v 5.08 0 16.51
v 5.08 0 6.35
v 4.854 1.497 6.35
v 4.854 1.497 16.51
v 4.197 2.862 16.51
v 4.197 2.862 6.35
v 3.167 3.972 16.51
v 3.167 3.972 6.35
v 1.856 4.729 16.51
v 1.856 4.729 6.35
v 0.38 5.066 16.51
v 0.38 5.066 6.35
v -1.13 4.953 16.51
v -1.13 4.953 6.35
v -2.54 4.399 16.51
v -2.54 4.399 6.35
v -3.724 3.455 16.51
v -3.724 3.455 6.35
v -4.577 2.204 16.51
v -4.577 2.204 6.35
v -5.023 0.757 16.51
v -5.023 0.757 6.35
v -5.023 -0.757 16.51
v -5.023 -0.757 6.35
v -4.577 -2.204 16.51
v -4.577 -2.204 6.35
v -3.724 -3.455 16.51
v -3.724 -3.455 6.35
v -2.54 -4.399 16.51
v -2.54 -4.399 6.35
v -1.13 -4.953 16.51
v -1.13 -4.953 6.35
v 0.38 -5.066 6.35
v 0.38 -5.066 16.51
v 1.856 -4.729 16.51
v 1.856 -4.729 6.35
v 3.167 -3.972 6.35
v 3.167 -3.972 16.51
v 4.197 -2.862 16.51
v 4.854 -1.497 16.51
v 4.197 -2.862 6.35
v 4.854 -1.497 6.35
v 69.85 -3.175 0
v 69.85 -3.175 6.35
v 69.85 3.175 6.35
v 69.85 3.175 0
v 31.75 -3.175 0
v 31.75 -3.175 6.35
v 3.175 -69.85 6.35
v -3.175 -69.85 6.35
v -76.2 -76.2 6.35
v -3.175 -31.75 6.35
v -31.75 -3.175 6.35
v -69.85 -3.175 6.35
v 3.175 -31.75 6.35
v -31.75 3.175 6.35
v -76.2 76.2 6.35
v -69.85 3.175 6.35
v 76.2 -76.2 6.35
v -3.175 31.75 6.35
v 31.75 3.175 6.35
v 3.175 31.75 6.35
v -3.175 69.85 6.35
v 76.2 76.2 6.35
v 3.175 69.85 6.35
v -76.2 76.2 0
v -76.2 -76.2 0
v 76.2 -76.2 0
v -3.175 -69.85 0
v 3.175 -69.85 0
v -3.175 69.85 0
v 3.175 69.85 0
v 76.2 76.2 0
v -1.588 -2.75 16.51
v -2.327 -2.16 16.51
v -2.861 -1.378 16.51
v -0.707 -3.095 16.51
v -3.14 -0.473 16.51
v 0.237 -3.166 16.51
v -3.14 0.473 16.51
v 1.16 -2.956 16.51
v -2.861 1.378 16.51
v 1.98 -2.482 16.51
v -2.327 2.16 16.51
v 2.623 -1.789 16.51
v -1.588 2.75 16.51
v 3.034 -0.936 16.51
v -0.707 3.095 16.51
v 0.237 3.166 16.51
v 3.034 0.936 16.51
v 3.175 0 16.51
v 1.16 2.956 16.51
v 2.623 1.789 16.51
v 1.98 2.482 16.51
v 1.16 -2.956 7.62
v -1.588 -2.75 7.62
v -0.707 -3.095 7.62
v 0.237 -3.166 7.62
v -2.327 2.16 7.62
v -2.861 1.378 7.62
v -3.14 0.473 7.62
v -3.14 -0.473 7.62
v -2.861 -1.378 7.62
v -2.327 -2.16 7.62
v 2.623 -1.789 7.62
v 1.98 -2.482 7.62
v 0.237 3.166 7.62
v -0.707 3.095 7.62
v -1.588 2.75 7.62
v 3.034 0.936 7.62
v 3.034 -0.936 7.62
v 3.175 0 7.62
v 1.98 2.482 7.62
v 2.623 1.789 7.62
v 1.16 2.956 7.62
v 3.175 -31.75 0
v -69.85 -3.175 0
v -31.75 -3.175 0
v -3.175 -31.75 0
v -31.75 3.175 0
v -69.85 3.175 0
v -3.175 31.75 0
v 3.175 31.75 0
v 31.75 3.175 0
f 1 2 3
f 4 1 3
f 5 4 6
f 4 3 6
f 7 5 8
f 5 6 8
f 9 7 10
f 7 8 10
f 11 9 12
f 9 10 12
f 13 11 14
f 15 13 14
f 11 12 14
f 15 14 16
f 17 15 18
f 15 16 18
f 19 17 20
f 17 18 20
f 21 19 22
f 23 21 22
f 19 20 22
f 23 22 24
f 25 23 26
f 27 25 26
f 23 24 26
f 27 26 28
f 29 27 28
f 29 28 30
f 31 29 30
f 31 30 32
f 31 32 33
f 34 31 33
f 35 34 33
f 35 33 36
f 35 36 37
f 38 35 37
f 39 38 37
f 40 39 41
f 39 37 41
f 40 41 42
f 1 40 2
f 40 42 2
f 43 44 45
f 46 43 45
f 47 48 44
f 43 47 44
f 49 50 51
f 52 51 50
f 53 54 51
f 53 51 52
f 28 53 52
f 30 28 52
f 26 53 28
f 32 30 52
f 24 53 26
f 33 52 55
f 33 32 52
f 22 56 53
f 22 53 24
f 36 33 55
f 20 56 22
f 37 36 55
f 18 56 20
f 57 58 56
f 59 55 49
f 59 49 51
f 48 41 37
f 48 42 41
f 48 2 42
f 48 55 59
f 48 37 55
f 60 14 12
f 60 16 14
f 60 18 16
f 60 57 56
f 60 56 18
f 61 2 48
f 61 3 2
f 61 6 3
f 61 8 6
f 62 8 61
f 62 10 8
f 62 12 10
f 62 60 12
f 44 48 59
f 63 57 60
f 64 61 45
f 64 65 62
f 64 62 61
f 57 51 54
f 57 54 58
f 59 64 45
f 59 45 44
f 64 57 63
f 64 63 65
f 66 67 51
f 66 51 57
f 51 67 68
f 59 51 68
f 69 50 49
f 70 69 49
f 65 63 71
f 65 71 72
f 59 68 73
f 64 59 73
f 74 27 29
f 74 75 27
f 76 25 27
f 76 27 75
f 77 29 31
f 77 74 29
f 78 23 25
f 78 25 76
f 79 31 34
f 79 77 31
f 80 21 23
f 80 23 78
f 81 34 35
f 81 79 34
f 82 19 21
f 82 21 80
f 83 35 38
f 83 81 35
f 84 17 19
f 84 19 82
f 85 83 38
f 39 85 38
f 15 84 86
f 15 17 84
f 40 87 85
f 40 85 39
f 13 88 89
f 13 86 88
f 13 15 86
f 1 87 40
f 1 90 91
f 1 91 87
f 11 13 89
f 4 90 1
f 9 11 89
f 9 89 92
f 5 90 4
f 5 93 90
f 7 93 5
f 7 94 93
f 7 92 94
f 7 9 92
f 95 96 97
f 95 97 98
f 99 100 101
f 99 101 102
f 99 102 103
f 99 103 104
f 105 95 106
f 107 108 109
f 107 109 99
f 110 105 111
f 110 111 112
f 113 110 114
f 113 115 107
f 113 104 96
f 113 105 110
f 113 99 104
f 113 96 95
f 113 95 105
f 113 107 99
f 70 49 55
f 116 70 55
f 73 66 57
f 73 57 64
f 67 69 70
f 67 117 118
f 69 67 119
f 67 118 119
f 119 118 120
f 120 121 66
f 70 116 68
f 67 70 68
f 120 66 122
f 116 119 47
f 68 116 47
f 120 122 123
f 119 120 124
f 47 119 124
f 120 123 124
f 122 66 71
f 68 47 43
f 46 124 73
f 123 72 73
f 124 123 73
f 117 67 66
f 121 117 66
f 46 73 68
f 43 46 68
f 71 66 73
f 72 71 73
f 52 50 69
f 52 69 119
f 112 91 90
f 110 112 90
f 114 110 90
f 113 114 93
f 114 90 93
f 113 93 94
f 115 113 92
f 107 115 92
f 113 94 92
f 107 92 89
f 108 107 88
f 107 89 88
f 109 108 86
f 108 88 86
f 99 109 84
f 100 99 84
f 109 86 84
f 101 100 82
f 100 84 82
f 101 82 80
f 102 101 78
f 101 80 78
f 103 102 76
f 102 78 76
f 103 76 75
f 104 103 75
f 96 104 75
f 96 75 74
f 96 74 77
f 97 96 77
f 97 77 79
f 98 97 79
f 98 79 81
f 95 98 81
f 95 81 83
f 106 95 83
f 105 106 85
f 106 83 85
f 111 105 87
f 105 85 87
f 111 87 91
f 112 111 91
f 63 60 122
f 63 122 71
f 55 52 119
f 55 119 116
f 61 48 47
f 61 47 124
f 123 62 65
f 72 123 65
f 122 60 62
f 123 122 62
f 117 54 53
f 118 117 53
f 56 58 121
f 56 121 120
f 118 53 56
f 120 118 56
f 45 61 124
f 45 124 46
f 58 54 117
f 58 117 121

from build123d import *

# Parameters (mm, degrees)
F0_W      = 152.4
F0_H      = 152.4
F1_DEPTH  = 6.35
F2_W      = 38.1
F2_H      = 6.35
F3_DEPTH  = 25.4
F4_W      = 6.35
F4_H      = 38.1
F5_DEPTH  = 25.4
F6_W      = 38.1
F6_H      = 6.35
F7_DEPTH  = 25.4
F8_W      = 6.35
F8_H      = 38.1
F9_DEPTH  = 25.4
F10_R     = 5.08
F11_DEPTH = 10.16
F12_R     = 3.175
F13_DEPTH = 8.89


with BuildPart() as f1:
    # F0 (on Top) → F1 (new body)
    with BuildSketch(Plane.XY):
        Rectangle(F0_W, F0_H)
    extrude(amount=F1_DEPTH)

    # F2 (on face) → F3 (cut)
    with BuildSketch(Plane.XY.offset(6.35)):
        with Locations((50.8, 0)):
            Rectangle(F2_W, F2_H)
    extrude(amount=-F3_DEPTH, mode=Mode.SUBTRACT)

    # F4 (on face) → F5 (cut)
    with BuildSketch(Plane.XY.offset(6.35)):
        with Locations((0, -50.8)):
            Rectangle(F4_W, F4_H)
    extrude(amount=-F5_DEPTH, mode=Mode.SUBTRACT)

    # F6 (on face) → F7 (cut)
    with BuildSketch(Plane.XY.offset(6.35)):
        with Locations((-50.8, 0)):
            Rectangle(F6_W, F6_H)
    extrude(amount=-F7_DEPTH, mode=Mode.SUBTRACT)

    # F8 (on face) → F9 (cut)
    with BuildSketch(Plane.XY.offset(6.35)):
        with Locations((0, 50.8)):
            Rectangle(F8_W, F8_H)
    extrude(amount=-F9_DEPTH, mode=Mode.SUBTRACT)

    # F10 (on face) → F11 (join)
    with BuildSketch(Plane.XY.offset(6.35)):
        Circle(F10_R)
    extrude(amount=F11_DEPTH)

    # F12 (on face) → F13 (cut)
    with BuildSketch(Plane.XY.offset(16.51)):
        Circle(F12_R)
    extrude(amount=-F13_DEPTH, mode=Mode.SUBTRACT)


solid = f1.part
